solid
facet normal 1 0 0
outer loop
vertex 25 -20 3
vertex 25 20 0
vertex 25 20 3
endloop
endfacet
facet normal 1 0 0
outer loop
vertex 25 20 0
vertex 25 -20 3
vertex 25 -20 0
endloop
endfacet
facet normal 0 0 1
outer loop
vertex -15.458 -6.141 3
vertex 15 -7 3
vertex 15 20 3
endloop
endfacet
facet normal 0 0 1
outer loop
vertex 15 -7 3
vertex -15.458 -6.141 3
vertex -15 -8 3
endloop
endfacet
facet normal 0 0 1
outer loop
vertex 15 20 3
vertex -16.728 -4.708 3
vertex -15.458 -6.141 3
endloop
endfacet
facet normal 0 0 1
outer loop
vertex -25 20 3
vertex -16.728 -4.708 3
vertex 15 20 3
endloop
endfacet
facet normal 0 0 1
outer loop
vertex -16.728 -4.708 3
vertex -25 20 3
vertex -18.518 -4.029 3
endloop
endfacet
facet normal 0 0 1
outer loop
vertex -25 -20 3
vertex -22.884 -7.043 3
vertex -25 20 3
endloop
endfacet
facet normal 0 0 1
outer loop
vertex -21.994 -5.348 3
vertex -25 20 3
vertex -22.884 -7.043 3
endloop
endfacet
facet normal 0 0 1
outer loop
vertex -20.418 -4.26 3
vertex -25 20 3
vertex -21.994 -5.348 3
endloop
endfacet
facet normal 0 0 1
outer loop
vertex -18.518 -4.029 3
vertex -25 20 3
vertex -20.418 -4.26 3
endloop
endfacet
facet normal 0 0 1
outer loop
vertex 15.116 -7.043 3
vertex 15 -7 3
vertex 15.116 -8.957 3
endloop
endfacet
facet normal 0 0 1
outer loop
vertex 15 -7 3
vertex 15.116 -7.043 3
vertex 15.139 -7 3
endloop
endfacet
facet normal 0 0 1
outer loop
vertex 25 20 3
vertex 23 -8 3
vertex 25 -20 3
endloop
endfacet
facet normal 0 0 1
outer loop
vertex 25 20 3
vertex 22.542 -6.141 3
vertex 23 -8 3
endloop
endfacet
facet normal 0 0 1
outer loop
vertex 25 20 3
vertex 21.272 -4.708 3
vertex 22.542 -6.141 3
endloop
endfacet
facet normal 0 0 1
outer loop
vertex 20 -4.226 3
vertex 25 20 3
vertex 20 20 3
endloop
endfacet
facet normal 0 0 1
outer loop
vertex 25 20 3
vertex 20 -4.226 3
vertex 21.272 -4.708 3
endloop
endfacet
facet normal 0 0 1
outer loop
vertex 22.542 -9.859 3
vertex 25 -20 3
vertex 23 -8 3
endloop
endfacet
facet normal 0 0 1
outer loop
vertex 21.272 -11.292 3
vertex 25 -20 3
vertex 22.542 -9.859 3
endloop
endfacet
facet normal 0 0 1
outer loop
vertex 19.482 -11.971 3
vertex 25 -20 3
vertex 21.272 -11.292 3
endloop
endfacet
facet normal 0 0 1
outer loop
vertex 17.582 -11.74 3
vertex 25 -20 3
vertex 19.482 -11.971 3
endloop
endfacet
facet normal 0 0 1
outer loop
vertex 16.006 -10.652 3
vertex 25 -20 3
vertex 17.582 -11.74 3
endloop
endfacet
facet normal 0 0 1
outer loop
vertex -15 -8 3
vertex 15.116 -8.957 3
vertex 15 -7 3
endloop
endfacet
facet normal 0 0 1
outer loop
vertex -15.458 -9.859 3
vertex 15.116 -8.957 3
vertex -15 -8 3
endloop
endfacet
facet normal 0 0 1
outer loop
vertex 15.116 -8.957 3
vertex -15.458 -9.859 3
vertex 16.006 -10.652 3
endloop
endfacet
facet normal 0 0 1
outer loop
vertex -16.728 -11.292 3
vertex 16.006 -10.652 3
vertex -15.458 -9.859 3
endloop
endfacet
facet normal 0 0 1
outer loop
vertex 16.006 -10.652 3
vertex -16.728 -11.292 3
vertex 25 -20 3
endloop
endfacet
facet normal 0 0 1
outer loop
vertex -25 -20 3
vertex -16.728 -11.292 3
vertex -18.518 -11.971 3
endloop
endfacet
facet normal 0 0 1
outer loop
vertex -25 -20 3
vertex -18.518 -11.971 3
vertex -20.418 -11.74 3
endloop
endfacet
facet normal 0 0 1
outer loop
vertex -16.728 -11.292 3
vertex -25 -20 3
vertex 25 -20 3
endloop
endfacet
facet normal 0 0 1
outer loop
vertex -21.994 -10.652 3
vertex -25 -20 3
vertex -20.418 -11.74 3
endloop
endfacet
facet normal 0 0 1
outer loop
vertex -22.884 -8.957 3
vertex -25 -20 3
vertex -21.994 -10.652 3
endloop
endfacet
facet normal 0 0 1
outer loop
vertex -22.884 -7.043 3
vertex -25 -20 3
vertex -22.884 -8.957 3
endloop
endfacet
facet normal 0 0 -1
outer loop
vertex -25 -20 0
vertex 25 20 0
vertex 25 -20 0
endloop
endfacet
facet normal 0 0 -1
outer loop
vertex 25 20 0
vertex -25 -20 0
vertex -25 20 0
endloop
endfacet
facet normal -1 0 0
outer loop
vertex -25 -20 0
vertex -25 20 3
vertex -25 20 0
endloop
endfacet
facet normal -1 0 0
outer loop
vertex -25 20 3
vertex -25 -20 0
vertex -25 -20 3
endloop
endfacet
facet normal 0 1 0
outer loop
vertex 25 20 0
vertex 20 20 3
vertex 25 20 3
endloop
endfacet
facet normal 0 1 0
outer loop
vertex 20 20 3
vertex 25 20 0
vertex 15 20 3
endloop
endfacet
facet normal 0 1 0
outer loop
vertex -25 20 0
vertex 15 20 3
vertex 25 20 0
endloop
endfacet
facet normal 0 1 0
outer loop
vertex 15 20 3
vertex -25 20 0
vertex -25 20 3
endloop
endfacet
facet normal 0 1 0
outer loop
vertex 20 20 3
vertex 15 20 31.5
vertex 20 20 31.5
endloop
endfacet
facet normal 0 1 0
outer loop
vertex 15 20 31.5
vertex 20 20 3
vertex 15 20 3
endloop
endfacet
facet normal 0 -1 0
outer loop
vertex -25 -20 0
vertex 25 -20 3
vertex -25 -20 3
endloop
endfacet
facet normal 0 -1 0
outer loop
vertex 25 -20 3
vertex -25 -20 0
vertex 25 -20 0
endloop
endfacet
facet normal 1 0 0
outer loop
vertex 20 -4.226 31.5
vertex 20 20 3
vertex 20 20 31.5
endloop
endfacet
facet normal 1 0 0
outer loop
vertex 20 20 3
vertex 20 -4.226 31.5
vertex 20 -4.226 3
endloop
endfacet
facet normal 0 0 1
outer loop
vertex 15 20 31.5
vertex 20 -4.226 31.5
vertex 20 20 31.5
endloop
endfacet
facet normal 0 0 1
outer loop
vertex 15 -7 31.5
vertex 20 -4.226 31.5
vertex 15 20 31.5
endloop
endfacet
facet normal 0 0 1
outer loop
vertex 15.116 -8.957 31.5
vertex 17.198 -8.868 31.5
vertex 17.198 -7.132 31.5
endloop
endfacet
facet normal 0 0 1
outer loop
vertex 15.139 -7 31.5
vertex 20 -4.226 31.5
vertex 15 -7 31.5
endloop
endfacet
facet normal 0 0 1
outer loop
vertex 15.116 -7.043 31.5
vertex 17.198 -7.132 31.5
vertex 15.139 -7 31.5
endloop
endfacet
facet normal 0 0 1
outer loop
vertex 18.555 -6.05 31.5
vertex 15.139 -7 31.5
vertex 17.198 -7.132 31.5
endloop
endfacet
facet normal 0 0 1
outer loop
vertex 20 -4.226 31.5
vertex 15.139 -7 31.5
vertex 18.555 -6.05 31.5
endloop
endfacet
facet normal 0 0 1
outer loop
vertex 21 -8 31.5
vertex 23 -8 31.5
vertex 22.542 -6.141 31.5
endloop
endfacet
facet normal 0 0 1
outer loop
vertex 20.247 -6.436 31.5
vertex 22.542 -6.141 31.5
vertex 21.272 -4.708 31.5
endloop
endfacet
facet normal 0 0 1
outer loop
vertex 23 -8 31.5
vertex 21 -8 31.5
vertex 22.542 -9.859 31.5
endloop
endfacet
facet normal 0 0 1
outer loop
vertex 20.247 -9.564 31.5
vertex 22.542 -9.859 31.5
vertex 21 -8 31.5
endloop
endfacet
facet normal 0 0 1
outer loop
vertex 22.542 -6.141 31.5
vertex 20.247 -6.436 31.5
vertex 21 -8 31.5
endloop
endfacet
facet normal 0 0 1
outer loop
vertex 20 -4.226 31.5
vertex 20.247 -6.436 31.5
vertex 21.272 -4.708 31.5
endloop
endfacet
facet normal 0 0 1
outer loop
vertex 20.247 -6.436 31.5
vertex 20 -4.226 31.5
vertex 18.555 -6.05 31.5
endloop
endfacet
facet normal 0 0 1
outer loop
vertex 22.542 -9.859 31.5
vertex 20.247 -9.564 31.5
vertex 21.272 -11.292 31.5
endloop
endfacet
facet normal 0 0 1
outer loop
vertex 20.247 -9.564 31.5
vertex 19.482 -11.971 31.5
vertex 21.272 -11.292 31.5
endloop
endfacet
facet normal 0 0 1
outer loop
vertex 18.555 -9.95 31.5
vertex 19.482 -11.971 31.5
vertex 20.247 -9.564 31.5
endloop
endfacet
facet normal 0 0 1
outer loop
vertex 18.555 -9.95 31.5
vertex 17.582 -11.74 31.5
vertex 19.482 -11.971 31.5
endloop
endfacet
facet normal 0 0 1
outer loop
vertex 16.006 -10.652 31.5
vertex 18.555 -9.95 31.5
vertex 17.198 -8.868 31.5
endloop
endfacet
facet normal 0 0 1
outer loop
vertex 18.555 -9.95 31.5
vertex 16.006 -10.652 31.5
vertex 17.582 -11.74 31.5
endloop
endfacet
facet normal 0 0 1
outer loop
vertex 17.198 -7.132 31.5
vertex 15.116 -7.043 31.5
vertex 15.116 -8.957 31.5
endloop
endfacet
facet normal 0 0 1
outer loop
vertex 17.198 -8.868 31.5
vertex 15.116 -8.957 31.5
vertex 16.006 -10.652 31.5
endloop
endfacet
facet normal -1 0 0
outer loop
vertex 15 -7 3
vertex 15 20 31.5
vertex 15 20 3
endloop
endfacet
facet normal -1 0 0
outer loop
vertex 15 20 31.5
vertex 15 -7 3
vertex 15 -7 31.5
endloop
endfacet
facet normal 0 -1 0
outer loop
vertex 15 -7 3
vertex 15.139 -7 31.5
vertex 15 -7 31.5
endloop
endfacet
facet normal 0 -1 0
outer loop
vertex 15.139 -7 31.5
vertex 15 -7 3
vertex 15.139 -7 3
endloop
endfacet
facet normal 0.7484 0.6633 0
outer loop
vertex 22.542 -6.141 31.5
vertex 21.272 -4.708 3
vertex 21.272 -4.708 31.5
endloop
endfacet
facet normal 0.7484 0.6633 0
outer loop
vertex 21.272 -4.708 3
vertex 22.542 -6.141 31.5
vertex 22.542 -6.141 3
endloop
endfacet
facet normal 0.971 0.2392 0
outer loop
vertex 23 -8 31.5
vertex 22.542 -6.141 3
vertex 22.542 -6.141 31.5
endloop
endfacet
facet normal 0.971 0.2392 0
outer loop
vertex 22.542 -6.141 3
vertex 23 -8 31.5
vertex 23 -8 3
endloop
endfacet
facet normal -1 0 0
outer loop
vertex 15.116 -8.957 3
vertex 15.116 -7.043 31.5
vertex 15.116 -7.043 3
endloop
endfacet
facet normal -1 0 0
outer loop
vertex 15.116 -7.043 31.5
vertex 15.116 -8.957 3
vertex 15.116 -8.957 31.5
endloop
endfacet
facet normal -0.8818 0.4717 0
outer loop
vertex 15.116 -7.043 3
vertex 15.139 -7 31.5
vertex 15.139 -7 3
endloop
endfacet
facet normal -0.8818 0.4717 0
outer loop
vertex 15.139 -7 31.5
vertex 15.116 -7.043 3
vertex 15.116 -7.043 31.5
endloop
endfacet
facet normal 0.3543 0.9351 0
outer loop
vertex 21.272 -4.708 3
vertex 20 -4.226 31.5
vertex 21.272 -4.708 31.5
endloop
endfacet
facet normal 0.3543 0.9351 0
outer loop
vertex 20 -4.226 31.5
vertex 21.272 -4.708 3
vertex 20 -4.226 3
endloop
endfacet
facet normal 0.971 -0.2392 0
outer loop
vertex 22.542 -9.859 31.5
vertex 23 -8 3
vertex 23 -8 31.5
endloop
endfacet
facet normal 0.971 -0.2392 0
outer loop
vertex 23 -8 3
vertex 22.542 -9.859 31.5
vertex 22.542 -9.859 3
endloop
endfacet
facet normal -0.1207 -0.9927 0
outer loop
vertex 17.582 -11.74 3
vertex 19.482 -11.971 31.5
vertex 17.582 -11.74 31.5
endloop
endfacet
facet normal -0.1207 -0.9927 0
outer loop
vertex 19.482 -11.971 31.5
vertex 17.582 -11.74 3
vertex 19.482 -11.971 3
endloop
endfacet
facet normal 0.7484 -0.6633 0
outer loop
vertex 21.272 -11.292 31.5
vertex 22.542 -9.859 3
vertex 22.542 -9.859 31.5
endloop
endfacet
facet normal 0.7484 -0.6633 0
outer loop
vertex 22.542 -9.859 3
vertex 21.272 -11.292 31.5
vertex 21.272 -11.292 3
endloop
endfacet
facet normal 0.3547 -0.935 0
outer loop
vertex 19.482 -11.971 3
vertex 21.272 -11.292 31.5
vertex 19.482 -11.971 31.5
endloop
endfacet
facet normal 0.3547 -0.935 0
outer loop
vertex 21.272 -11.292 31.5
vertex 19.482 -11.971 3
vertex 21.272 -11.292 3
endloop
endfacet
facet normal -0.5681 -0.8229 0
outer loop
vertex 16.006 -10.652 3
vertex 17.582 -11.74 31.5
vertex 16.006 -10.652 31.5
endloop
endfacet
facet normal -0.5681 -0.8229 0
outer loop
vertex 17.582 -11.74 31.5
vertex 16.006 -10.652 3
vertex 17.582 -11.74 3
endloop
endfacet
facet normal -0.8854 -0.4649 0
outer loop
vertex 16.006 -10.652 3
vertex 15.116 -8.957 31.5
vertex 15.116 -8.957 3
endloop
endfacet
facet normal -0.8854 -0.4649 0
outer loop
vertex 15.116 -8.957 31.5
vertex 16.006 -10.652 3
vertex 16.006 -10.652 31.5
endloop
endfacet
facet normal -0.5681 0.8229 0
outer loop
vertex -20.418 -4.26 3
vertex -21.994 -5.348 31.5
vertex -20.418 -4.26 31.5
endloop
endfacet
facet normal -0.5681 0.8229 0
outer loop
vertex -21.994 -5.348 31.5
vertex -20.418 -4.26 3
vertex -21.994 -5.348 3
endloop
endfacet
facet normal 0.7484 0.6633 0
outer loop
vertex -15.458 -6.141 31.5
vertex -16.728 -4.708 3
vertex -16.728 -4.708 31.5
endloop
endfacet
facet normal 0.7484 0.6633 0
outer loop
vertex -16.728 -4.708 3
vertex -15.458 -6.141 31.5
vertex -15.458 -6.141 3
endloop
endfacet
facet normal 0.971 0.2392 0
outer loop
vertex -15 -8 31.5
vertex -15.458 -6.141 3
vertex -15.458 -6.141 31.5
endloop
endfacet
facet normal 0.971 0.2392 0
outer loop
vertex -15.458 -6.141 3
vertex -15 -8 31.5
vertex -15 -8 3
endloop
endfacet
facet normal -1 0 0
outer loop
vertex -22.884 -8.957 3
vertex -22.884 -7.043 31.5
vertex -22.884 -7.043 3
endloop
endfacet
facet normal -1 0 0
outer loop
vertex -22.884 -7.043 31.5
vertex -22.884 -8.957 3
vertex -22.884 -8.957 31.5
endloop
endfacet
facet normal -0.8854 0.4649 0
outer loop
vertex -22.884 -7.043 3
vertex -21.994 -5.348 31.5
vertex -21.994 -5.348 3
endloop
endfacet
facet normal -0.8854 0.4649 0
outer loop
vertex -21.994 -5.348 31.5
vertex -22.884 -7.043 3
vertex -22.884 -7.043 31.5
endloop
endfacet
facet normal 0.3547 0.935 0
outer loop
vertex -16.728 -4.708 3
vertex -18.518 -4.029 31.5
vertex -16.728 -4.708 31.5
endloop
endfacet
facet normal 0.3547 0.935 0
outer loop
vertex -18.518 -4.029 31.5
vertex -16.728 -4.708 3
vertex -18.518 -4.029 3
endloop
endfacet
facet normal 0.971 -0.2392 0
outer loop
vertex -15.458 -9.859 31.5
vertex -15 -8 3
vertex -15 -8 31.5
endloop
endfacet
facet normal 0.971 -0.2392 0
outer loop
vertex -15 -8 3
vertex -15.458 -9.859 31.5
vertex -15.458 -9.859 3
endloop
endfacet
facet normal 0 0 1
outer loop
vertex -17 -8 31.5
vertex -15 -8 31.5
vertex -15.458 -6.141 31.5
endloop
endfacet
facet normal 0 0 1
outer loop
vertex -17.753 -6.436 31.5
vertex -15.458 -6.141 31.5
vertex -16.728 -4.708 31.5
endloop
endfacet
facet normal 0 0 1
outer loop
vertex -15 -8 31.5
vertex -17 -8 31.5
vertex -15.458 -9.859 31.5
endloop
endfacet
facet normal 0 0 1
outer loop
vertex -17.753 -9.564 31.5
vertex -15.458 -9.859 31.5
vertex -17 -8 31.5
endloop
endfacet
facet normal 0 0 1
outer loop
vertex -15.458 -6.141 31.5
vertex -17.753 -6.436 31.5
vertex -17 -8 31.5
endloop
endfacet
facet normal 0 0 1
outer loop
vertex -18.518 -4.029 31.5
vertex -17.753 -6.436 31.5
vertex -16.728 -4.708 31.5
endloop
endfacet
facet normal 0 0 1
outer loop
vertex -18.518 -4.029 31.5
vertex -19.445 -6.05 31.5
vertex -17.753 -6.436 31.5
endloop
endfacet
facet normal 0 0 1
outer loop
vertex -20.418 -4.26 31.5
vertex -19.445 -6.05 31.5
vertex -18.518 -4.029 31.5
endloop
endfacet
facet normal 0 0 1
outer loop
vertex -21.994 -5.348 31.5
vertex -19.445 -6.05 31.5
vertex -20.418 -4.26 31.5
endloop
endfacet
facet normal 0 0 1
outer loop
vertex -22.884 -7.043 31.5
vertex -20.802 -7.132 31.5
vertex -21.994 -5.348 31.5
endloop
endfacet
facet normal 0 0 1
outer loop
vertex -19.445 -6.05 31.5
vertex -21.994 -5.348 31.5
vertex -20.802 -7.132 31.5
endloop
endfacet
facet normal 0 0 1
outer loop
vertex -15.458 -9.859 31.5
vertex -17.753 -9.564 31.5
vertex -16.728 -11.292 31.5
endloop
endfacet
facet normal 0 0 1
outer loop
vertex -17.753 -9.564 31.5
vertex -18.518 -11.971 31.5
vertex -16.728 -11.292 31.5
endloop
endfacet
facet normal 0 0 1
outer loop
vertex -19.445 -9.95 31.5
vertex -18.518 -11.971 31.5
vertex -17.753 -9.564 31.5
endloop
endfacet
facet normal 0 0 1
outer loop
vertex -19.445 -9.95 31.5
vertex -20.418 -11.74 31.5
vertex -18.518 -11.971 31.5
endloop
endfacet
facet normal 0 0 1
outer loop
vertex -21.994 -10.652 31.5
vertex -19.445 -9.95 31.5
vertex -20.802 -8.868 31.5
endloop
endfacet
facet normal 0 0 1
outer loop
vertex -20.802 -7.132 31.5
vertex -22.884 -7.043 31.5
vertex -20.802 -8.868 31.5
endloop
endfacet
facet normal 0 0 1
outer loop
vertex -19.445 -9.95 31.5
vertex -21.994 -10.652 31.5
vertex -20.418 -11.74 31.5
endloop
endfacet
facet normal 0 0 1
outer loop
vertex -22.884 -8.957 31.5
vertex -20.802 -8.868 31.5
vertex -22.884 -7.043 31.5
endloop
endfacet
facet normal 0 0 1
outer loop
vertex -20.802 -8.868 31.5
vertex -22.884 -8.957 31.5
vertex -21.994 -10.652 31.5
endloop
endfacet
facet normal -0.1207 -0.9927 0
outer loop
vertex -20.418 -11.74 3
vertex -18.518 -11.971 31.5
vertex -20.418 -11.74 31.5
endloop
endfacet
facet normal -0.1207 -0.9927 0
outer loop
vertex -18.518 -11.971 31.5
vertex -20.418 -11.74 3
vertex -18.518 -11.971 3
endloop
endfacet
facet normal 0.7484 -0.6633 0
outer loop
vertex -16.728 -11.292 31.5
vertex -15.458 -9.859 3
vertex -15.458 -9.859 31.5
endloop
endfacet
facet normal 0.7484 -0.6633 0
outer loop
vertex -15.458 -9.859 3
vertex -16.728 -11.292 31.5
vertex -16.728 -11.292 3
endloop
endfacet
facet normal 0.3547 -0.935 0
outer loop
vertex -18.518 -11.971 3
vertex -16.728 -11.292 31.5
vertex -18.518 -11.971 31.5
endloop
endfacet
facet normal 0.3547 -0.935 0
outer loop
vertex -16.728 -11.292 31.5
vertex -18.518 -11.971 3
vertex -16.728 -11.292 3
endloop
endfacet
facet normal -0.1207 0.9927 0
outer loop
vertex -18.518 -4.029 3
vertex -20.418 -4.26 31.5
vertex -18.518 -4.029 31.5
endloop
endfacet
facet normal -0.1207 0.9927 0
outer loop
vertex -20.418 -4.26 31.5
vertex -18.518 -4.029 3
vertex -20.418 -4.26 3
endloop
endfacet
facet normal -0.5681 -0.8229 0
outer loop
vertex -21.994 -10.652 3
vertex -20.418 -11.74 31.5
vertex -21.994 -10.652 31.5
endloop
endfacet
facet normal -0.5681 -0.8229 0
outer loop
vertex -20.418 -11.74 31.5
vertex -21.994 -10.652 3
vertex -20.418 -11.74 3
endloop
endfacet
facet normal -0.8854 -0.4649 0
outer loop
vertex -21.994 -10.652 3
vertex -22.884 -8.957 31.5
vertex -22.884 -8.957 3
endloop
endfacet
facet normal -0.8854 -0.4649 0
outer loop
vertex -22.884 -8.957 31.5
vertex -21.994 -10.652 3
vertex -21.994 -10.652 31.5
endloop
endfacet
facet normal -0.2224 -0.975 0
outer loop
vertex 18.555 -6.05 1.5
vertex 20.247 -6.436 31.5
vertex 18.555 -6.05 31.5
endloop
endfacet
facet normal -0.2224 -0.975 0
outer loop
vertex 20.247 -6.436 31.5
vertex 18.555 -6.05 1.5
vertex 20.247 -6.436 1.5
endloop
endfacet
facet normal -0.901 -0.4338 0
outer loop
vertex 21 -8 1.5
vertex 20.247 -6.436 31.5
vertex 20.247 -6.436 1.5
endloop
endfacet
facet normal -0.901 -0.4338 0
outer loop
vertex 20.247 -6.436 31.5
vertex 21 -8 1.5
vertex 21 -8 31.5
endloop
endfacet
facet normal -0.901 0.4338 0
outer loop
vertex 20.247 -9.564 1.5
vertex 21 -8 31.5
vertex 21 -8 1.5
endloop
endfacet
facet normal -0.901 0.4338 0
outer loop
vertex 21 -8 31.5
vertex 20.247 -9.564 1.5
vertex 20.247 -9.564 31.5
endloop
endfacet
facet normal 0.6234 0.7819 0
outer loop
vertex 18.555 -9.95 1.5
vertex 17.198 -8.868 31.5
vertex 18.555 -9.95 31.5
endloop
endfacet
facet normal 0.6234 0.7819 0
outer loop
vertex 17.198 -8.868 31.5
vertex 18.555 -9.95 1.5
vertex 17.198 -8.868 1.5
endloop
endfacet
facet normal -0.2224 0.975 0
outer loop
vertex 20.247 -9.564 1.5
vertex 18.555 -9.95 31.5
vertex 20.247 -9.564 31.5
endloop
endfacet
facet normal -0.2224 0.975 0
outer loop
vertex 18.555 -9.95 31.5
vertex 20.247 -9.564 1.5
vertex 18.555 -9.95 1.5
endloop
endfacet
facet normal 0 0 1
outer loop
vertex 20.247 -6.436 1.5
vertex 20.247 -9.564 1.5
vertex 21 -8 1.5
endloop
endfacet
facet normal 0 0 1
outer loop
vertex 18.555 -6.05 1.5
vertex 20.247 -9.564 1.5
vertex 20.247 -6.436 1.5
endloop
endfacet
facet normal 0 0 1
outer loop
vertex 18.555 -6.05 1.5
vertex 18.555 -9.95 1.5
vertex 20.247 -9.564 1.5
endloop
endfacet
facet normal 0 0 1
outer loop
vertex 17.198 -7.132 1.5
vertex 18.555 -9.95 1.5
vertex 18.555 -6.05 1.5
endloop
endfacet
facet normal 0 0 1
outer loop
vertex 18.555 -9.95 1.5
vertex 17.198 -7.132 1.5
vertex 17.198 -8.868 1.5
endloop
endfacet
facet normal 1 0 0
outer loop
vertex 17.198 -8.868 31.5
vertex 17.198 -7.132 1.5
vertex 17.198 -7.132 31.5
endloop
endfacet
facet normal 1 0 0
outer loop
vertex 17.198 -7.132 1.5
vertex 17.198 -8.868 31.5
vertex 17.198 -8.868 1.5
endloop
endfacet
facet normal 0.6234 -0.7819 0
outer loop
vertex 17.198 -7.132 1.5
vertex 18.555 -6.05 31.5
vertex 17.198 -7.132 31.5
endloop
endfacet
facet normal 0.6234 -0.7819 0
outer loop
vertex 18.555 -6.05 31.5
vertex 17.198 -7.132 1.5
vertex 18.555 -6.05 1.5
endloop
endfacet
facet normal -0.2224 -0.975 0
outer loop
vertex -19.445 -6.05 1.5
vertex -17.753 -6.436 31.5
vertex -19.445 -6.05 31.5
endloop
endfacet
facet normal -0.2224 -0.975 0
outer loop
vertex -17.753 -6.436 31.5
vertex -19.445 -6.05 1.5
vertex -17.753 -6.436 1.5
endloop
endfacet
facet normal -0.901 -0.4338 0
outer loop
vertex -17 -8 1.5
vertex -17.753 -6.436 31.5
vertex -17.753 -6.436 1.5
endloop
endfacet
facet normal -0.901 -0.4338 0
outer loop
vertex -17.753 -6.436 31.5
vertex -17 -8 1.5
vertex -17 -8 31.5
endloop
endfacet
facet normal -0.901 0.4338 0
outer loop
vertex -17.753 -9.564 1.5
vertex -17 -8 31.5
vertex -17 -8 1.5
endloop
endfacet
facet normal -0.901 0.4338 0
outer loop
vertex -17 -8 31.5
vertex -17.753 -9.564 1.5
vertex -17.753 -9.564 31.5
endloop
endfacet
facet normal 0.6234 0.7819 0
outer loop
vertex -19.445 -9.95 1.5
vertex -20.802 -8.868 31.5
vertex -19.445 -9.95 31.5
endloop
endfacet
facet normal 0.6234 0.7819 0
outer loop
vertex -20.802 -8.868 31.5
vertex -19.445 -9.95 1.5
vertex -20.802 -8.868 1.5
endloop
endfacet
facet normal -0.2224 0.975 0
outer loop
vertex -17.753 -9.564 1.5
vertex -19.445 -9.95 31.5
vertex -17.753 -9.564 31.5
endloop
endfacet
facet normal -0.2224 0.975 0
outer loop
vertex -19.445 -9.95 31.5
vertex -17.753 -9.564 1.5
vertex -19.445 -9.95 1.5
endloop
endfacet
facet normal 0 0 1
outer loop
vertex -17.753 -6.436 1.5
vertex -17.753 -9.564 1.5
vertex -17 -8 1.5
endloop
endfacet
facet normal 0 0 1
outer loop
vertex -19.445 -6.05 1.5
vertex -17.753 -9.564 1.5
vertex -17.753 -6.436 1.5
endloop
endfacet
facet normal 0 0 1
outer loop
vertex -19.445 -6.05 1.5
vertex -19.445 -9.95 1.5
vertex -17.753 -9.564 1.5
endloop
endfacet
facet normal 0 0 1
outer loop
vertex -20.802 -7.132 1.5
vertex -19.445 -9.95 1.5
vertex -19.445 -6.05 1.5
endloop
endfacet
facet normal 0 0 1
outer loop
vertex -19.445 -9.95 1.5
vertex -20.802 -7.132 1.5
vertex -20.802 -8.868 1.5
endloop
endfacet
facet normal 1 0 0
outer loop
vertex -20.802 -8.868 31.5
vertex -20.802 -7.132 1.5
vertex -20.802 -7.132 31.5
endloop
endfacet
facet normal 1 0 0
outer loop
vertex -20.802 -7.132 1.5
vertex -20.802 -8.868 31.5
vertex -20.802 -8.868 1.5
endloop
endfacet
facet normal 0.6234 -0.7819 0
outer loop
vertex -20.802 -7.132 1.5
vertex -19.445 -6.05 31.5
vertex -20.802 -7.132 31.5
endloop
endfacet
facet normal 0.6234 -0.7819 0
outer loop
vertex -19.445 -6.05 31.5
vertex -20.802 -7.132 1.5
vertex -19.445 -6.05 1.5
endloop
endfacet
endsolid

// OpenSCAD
//Turbidostat
//Stirrer
//DC Motor Holder
//by: Agostino Guarino agostinoguarino@gmail.com


//Dimensions of the Test Tube, in mm
ttube_ext_diam=25;

//Structure Dimensions
ext_tolerance=1; //gap between the tube and the holder
support_ext_diam=ttube_ext_diam+8;
base_side1=50;
base_side2=40;
base_height=3;
central_hole_radius=5;
mount_hole_radius=2;
wall_side1=5;
wall_side2=27;
wall_height=30;

union(){
    difference(){
        union(){
            translate([0,0,base_height/2])cube([base_side1, base_side2, base_height],true);
            translate([15+(wall_side1/2),6.5,(base_height+wall_height)/2])cube([wall_side1, wall_side2, wall_height],true);
            translate([19,-8,(base_height+30)/2])cylinder(30, mount_hole_radius+2, mount_hole_radius+2,true);
            translate([-19,-8,(base_height+30)/2])cylinder(30, mount_hole_radius+2, mount_hole_radius+2,true);
            }
        union(){
            translate([19,-8,(base_height+30)/2])cylinder(30, mount_hole_radius, mount_hole_radius,true);
            translate([-19,-8,(base_height+30)/2])cylinder(30, mount_hole_radius, mount_hole_radius,true);
            }
    }
    
}
